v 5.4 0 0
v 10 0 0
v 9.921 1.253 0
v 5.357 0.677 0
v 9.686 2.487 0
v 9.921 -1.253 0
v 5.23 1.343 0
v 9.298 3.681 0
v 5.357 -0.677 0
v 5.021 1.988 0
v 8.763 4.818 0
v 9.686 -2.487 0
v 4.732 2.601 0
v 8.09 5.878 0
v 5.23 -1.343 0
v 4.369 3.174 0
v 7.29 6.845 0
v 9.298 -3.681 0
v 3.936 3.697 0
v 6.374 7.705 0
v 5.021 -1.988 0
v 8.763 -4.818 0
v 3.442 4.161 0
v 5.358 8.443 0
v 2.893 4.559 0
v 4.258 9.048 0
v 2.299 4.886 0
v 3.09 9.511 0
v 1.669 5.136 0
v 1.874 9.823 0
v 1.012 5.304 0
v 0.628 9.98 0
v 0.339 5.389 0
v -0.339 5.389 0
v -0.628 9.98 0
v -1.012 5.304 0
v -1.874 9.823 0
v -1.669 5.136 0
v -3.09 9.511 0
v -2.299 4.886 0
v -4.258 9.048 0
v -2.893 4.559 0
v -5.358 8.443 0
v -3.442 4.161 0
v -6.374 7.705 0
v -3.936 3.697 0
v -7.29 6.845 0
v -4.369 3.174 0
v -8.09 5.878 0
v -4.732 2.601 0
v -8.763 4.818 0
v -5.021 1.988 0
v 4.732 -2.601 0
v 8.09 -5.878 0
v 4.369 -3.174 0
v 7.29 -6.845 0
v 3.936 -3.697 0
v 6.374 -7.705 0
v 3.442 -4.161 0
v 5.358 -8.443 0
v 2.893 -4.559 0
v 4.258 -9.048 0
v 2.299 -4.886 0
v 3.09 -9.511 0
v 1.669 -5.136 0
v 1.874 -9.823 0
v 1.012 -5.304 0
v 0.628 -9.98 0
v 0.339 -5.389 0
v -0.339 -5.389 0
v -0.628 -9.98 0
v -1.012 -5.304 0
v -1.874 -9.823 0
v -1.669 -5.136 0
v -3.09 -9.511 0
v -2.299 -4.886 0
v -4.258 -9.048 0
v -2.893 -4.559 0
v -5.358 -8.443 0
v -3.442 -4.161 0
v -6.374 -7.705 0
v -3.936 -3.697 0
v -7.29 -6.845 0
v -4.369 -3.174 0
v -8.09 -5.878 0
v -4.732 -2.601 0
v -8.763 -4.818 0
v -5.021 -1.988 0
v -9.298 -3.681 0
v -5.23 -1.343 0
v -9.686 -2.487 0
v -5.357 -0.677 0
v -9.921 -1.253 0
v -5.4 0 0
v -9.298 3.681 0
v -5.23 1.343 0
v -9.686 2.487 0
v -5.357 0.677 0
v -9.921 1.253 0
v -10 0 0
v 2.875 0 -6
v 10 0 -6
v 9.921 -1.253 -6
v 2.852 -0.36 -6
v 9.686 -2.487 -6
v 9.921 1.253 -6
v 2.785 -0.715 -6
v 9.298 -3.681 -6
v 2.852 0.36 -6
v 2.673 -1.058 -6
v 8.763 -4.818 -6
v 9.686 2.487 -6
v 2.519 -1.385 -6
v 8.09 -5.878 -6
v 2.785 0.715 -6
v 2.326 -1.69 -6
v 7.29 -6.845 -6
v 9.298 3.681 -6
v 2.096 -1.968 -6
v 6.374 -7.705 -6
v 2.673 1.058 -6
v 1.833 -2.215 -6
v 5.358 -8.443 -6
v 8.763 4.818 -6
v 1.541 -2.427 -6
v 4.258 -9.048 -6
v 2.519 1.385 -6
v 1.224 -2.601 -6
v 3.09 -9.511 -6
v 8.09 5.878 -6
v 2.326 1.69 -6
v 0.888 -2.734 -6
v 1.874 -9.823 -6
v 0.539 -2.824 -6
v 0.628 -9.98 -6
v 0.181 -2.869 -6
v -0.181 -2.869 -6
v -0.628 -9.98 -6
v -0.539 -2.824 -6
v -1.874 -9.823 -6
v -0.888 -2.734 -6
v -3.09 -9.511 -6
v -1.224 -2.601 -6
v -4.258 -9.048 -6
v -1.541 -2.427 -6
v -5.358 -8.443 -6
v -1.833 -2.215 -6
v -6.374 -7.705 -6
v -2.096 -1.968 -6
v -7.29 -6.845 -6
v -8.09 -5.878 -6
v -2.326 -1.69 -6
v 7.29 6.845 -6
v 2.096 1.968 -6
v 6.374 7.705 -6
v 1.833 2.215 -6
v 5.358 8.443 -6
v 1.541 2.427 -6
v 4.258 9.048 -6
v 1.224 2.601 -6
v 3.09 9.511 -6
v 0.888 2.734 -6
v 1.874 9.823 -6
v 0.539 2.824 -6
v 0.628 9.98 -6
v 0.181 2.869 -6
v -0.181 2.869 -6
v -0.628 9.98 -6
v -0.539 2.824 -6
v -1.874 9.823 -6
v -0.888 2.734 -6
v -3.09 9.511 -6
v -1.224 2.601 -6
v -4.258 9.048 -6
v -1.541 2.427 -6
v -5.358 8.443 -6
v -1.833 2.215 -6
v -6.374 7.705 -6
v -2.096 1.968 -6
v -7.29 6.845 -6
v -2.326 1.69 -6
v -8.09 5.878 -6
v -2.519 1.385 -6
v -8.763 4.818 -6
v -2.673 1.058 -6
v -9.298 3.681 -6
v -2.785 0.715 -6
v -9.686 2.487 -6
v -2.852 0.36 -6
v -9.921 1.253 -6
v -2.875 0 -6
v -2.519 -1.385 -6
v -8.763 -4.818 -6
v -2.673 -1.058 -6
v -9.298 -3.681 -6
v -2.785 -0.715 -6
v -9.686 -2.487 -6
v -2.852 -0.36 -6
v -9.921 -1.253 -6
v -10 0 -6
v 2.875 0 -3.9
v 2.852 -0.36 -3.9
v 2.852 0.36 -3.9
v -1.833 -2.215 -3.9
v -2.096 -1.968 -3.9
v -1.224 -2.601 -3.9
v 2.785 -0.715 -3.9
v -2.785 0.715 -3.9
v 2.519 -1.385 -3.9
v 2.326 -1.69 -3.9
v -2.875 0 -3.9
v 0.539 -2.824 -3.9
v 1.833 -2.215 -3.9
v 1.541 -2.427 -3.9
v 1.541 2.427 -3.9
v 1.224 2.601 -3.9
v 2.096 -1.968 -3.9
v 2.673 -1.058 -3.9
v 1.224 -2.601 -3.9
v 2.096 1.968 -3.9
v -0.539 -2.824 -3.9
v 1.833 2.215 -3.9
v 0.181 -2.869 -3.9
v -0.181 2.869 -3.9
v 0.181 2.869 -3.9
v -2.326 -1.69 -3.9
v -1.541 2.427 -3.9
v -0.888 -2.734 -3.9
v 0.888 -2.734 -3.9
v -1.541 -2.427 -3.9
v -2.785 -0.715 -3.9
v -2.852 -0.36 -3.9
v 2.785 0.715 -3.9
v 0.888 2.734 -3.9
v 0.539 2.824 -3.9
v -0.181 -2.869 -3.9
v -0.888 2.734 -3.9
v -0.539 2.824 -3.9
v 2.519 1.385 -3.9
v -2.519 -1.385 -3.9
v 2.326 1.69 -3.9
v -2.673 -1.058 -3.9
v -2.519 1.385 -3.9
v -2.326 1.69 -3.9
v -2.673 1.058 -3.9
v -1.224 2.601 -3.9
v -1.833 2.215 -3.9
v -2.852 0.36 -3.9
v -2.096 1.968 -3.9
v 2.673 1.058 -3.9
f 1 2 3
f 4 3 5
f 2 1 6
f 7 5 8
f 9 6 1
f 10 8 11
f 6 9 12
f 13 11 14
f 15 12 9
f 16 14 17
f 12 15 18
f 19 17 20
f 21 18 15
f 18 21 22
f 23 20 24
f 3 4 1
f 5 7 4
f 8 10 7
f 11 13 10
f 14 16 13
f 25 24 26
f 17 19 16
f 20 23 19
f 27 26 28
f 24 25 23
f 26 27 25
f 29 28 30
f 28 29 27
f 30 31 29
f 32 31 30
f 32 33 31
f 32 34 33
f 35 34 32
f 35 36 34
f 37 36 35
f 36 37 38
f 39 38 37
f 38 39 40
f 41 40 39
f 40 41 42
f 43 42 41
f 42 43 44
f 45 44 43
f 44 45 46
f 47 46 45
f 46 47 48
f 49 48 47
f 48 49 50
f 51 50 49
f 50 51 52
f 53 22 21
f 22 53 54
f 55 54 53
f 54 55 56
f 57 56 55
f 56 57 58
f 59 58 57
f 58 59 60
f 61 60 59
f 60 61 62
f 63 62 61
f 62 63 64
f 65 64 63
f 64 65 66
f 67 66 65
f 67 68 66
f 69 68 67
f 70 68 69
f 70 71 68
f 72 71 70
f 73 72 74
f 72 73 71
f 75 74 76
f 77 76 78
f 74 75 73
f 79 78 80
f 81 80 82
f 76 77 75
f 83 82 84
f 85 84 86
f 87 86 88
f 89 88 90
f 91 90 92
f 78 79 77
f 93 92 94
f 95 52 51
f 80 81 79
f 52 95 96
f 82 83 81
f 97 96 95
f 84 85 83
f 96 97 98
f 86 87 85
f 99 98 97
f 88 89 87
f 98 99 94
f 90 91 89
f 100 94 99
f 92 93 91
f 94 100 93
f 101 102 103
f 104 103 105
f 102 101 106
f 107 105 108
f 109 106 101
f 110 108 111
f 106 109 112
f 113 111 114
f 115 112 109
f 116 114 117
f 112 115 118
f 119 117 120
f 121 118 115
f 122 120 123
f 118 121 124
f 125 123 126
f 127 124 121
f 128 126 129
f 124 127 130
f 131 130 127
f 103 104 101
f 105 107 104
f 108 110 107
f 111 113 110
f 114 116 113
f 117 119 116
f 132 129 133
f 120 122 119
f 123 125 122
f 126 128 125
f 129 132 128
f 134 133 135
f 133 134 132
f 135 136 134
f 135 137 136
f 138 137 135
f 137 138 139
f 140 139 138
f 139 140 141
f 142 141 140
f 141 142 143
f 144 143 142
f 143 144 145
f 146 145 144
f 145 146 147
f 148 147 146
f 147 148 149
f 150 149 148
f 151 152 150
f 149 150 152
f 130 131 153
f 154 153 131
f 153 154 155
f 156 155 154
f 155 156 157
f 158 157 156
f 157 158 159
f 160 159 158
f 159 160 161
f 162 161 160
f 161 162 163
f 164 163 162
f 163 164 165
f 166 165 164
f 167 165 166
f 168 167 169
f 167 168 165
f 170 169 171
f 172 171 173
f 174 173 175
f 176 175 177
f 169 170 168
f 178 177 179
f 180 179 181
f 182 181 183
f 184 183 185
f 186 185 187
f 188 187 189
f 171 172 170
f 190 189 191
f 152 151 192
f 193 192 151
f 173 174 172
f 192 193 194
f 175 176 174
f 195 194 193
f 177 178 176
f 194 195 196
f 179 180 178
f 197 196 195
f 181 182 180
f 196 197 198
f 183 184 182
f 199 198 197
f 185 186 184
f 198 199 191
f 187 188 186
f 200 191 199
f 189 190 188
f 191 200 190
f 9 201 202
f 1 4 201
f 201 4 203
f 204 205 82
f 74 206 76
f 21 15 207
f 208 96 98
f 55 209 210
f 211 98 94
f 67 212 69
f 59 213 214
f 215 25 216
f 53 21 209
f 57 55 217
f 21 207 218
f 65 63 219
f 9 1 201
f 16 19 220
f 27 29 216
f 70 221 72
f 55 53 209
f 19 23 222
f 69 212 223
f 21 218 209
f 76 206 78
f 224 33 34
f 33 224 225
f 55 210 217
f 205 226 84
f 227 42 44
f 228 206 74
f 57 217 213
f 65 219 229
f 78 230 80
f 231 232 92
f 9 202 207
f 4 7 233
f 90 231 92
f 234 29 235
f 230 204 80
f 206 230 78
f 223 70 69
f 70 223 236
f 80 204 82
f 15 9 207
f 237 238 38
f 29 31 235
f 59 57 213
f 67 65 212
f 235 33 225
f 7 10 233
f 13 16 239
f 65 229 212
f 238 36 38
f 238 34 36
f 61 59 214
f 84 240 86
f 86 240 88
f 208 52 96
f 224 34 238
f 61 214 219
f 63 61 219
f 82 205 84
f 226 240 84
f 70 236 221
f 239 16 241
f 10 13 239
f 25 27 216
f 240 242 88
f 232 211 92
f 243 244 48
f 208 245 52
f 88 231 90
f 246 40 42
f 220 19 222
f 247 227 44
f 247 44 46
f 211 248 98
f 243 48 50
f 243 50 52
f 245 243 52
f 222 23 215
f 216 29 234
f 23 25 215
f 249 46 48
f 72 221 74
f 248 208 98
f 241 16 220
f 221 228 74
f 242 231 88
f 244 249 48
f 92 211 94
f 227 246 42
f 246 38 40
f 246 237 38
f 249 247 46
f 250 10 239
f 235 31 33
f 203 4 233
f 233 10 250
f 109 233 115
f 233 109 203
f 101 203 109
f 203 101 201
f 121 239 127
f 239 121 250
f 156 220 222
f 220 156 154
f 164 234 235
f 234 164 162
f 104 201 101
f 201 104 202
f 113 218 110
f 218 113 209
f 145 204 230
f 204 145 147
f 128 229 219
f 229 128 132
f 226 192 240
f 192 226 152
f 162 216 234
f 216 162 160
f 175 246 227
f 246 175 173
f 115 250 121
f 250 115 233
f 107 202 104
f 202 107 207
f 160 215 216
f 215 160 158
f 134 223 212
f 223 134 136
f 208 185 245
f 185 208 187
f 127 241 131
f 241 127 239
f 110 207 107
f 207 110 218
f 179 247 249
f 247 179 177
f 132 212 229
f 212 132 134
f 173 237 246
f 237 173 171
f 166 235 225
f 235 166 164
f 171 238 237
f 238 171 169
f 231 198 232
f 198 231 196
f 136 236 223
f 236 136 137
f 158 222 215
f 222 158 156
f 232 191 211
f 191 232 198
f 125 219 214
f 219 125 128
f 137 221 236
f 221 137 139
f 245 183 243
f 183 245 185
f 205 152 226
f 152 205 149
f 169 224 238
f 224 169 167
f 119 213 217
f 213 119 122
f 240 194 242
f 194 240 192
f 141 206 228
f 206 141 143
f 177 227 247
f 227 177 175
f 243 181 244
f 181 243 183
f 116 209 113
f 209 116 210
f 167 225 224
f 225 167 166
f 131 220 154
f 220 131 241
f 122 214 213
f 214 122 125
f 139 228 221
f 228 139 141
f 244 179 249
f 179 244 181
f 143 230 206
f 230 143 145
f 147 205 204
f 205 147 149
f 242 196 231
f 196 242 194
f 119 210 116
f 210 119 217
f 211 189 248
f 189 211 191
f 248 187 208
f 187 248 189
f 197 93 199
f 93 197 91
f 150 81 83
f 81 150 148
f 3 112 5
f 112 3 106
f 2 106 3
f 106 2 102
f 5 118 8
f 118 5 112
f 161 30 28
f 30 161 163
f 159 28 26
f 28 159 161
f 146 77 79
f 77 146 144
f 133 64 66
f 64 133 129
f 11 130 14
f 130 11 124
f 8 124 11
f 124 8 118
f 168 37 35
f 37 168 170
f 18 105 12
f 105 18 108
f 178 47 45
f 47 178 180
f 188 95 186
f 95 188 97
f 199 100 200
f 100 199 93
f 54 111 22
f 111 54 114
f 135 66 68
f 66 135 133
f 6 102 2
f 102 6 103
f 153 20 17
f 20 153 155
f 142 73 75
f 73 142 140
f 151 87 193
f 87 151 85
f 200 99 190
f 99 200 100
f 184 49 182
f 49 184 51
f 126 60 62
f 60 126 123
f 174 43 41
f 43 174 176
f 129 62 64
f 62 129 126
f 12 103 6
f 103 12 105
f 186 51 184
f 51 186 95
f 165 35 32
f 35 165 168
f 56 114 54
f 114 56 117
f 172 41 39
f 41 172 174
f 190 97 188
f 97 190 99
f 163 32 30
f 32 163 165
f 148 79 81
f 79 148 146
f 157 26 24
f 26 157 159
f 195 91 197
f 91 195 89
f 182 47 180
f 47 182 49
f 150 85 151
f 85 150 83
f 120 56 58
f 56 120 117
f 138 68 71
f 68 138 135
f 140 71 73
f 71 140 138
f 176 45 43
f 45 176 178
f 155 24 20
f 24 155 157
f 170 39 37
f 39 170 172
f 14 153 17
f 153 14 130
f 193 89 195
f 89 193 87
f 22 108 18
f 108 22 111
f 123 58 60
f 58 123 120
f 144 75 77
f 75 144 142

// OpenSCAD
$fn = 50;


difference() {
	union() {
		translate(v = [0, 0, -6.0000000000]) {
			cylinder(h = 6, r = 10.0000000000);
		}
		cylinder(h = 0, r = 19.0000000000);
	}
	union() {
		translate(v = [0, 0, 0]) {
			rotate(a = [0, 0, 0]) {
				difference() {
					union() {
						#translate(v = [0, 0, -6.0000000000]) {
							cylinder(h = 6, r = 2.6000000000);
						}
						#translate(v = [0, 0, -3.9000000000]) {
							cylinder(h = 3.9000000000, r1 = 2.8750000000, r2 = 5.4000000000);
						}
						#translate(v = [0, 0, -6.0000000000]) {
							cylinder(h = 6, r = 2.8750000000);
						}
						#translate(v = [0, 0, -6.0000000000]) {
							cylinder(h = 6, r = 2.6000000000);
						}
					}
					union();
				}
			}
		}
	}
}
